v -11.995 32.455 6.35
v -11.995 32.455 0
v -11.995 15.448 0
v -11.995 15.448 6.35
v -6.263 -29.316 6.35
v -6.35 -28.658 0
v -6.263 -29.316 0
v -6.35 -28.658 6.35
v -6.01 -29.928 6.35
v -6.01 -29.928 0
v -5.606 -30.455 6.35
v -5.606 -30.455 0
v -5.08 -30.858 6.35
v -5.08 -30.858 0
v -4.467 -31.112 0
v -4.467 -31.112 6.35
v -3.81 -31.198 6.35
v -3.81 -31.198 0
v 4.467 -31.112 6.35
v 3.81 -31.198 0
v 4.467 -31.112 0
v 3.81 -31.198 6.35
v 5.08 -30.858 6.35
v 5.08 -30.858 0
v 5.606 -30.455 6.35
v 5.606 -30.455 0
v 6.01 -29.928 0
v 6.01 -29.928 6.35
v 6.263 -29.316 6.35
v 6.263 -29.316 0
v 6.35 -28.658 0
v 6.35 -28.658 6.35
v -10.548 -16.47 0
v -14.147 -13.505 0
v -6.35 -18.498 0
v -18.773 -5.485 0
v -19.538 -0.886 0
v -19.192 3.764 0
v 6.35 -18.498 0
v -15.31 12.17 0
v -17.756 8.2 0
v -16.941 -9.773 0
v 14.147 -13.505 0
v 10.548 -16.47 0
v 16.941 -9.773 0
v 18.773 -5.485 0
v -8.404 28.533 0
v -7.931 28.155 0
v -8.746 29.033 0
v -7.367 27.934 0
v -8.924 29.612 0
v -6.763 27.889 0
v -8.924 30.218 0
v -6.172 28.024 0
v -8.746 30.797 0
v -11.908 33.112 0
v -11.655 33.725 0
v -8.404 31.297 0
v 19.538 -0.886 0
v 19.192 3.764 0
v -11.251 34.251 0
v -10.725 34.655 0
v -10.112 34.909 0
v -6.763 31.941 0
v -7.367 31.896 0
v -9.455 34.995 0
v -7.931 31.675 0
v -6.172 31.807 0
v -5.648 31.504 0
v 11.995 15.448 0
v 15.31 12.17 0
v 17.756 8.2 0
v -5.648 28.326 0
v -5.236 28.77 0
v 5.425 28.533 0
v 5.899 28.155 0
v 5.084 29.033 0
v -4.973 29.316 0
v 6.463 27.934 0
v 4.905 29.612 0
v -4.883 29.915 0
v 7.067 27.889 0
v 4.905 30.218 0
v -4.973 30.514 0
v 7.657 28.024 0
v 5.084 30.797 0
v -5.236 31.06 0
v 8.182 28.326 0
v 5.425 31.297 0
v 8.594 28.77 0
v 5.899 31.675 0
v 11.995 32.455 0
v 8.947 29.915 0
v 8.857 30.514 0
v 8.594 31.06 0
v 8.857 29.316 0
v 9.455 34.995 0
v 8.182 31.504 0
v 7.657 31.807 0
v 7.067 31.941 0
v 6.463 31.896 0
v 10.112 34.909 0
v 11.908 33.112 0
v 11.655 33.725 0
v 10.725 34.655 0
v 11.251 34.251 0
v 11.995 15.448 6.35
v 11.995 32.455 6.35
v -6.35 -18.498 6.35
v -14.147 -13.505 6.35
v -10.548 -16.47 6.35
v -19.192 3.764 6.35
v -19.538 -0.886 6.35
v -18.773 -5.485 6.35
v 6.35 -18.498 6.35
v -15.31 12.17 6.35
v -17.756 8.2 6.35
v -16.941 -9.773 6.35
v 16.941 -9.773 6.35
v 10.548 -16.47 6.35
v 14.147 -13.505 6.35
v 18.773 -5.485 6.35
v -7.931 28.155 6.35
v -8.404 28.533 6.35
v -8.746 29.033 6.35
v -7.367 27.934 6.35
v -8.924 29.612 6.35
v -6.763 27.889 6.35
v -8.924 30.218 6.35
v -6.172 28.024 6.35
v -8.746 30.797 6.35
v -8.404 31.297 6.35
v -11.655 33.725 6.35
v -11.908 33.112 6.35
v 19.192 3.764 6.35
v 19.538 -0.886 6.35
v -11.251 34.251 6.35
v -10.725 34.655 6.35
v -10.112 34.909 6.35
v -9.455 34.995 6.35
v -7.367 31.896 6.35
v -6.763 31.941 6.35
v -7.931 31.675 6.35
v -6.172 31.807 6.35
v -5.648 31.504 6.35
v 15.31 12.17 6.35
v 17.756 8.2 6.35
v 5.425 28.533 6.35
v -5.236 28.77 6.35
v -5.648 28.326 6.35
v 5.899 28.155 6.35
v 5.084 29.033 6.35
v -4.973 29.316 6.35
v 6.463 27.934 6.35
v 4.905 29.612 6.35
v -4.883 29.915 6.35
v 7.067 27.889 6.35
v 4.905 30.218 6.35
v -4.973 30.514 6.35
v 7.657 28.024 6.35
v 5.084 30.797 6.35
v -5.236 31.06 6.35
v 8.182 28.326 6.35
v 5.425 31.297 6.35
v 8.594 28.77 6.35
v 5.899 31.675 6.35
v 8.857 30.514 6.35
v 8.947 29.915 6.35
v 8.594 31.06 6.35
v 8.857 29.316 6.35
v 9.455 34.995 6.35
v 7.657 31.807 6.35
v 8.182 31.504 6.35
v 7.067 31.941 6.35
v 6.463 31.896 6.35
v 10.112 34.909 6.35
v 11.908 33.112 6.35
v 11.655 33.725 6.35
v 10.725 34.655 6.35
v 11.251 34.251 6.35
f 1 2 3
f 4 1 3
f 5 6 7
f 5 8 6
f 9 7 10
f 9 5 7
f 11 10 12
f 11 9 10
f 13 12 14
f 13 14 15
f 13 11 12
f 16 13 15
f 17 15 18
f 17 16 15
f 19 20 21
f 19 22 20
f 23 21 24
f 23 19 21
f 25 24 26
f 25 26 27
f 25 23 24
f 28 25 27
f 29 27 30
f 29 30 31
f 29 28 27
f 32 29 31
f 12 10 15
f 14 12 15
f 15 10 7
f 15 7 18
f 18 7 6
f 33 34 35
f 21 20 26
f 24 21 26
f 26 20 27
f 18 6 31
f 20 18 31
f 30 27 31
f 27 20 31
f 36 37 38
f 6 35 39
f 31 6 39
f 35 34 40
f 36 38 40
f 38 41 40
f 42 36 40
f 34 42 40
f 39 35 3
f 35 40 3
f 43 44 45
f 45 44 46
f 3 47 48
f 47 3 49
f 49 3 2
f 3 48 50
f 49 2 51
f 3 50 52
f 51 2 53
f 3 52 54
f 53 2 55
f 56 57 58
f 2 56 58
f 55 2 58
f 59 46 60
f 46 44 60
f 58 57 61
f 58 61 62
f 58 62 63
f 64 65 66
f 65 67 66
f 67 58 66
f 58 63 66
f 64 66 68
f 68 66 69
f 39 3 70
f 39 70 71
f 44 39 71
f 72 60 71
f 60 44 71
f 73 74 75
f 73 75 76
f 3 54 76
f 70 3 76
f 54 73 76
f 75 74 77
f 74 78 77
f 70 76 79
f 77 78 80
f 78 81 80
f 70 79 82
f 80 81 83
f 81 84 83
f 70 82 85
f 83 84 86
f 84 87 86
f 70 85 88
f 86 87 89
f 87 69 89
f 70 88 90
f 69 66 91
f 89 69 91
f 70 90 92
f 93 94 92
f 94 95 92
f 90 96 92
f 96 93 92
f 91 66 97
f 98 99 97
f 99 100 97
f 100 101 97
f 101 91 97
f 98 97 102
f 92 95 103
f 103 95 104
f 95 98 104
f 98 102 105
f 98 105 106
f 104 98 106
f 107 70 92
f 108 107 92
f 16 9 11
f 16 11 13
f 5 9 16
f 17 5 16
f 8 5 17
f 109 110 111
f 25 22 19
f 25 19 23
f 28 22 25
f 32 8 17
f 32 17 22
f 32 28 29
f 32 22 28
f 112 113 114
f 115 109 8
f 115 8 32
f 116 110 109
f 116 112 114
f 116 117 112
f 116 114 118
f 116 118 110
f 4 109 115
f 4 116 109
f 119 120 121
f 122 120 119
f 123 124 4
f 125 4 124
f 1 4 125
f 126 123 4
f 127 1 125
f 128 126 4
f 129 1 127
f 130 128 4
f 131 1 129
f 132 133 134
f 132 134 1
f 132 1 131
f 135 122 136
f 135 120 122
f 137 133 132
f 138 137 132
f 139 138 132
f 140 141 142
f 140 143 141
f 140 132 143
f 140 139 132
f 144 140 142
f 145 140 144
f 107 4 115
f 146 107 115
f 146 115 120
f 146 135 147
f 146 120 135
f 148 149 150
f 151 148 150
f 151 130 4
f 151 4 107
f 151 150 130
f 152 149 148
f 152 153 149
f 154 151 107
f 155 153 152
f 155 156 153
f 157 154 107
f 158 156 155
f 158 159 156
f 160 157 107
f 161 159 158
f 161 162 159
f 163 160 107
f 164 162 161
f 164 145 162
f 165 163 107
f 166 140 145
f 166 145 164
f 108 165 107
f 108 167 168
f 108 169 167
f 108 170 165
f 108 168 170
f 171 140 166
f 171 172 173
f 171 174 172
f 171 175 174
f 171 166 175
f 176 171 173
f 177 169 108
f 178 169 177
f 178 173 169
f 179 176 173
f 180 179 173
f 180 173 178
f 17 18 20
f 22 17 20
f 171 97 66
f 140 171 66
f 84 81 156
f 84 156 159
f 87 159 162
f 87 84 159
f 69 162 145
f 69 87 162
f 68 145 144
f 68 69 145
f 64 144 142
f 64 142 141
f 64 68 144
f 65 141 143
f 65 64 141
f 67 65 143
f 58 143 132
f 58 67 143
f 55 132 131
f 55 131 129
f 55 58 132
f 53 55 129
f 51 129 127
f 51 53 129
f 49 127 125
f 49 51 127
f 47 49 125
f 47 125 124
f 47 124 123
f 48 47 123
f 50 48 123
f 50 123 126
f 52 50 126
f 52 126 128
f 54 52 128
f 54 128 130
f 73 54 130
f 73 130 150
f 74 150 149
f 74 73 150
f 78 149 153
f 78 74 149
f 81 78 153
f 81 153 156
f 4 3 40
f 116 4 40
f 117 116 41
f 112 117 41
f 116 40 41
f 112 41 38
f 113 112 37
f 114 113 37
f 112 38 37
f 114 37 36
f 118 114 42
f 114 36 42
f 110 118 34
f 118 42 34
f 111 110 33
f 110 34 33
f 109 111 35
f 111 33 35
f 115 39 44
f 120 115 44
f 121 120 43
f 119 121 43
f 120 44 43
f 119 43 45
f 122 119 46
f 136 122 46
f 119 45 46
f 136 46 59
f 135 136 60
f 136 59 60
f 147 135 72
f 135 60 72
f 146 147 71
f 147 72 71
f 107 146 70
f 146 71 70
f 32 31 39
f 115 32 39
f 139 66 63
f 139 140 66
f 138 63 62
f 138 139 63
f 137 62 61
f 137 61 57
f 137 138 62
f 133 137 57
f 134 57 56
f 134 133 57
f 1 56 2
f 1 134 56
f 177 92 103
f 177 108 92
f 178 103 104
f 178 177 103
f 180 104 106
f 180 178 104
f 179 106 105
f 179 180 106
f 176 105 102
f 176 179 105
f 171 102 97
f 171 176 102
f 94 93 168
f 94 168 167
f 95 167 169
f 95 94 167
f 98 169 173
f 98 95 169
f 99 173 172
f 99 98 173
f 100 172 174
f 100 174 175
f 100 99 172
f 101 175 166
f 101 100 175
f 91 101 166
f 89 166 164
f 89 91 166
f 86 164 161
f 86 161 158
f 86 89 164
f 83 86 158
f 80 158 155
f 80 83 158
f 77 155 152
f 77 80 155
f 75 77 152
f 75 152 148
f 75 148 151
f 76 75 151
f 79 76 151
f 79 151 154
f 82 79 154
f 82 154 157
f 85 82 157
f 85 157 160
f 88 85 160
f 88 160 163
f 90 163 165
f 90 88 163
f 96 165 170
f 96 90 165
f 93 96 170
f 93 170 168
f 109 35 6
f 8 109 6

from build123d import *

# Parameters (mm, degrees)
SKETCH1_R           = 2.032
BOSS_EXTRUDE1_DEPTH = 6.35
FILLET1_R           = 2.54


with BuildPart() as part:
    # Sketch1 → Boss-Extrude1 (new body)
    with BuildSketch(Plane.XY):
        with BuildLine():
            ThreePointArc((6.35, -18.498455719), (0, -19.558), (-6.35, -18.498455719))
            Line((-6.35, -18.498455719), (-6.35, -31.198455719))
            Line((-6.35, -31.198455719), (6.35, -31.198455719))
            Line((6.35, -31.198455719), (6.35, -18.498455719))
        make_face()
        with BuildLine():
            Line((-11.994797213, 34.995050133), (-11.994797213, 15.447983811))
            ThreePointArc((-11.994797213, 15.447983811), (-19.293083875, -3.208158134), (-6.35, -18.498455719))
            Line((-6.35, -18.498455719), (6.35, -18.498455719))
            ThreePointArc((6.35, -18.498455719), (19.293083875, -3.208158134), (11.994797213, 15.447983811))
            Line((11.994797213, 15.447983811), (11.994797213, 34.995050133))
            Line((11.994797213, 34.995050133), (-11.994797213, 34.995050133))
        make_face()
        with Locations((-6.914797213, 29.915050133)):
            Circle(SKETCH1_R, mode=Mode.SUBTRACT)
        with Locations((6.914797213, 29.915050133)):
            Circle(SKETCH1_R, mode=Mode.SUBTRACT)
        with BuildLine():
            Line((6.35, -18.498455719), (-6.35, -18.498455719))
            ThreePointArc((-6.35, -18.498455719), (0, -19.558), (6.35, -18.498455719))
        make_face()
    extrude(amount=BOSS_EXTRUDE1_DEPTH)

    # Fillet1
    fillet1_edges = [part.edges().sort_by_distance(p)[0] for p in [
        (6.35, -31.198455719, 3.175),
        (-6.35, -31.198455719, 3.175),
        (11.994797213, 34.995050133, 3.175),
        (-11.994797213, 34.995050133, 3.175),
    ]]
    fillet(fillet1_edges, radius=FILLET1_R)


solid = part.part
